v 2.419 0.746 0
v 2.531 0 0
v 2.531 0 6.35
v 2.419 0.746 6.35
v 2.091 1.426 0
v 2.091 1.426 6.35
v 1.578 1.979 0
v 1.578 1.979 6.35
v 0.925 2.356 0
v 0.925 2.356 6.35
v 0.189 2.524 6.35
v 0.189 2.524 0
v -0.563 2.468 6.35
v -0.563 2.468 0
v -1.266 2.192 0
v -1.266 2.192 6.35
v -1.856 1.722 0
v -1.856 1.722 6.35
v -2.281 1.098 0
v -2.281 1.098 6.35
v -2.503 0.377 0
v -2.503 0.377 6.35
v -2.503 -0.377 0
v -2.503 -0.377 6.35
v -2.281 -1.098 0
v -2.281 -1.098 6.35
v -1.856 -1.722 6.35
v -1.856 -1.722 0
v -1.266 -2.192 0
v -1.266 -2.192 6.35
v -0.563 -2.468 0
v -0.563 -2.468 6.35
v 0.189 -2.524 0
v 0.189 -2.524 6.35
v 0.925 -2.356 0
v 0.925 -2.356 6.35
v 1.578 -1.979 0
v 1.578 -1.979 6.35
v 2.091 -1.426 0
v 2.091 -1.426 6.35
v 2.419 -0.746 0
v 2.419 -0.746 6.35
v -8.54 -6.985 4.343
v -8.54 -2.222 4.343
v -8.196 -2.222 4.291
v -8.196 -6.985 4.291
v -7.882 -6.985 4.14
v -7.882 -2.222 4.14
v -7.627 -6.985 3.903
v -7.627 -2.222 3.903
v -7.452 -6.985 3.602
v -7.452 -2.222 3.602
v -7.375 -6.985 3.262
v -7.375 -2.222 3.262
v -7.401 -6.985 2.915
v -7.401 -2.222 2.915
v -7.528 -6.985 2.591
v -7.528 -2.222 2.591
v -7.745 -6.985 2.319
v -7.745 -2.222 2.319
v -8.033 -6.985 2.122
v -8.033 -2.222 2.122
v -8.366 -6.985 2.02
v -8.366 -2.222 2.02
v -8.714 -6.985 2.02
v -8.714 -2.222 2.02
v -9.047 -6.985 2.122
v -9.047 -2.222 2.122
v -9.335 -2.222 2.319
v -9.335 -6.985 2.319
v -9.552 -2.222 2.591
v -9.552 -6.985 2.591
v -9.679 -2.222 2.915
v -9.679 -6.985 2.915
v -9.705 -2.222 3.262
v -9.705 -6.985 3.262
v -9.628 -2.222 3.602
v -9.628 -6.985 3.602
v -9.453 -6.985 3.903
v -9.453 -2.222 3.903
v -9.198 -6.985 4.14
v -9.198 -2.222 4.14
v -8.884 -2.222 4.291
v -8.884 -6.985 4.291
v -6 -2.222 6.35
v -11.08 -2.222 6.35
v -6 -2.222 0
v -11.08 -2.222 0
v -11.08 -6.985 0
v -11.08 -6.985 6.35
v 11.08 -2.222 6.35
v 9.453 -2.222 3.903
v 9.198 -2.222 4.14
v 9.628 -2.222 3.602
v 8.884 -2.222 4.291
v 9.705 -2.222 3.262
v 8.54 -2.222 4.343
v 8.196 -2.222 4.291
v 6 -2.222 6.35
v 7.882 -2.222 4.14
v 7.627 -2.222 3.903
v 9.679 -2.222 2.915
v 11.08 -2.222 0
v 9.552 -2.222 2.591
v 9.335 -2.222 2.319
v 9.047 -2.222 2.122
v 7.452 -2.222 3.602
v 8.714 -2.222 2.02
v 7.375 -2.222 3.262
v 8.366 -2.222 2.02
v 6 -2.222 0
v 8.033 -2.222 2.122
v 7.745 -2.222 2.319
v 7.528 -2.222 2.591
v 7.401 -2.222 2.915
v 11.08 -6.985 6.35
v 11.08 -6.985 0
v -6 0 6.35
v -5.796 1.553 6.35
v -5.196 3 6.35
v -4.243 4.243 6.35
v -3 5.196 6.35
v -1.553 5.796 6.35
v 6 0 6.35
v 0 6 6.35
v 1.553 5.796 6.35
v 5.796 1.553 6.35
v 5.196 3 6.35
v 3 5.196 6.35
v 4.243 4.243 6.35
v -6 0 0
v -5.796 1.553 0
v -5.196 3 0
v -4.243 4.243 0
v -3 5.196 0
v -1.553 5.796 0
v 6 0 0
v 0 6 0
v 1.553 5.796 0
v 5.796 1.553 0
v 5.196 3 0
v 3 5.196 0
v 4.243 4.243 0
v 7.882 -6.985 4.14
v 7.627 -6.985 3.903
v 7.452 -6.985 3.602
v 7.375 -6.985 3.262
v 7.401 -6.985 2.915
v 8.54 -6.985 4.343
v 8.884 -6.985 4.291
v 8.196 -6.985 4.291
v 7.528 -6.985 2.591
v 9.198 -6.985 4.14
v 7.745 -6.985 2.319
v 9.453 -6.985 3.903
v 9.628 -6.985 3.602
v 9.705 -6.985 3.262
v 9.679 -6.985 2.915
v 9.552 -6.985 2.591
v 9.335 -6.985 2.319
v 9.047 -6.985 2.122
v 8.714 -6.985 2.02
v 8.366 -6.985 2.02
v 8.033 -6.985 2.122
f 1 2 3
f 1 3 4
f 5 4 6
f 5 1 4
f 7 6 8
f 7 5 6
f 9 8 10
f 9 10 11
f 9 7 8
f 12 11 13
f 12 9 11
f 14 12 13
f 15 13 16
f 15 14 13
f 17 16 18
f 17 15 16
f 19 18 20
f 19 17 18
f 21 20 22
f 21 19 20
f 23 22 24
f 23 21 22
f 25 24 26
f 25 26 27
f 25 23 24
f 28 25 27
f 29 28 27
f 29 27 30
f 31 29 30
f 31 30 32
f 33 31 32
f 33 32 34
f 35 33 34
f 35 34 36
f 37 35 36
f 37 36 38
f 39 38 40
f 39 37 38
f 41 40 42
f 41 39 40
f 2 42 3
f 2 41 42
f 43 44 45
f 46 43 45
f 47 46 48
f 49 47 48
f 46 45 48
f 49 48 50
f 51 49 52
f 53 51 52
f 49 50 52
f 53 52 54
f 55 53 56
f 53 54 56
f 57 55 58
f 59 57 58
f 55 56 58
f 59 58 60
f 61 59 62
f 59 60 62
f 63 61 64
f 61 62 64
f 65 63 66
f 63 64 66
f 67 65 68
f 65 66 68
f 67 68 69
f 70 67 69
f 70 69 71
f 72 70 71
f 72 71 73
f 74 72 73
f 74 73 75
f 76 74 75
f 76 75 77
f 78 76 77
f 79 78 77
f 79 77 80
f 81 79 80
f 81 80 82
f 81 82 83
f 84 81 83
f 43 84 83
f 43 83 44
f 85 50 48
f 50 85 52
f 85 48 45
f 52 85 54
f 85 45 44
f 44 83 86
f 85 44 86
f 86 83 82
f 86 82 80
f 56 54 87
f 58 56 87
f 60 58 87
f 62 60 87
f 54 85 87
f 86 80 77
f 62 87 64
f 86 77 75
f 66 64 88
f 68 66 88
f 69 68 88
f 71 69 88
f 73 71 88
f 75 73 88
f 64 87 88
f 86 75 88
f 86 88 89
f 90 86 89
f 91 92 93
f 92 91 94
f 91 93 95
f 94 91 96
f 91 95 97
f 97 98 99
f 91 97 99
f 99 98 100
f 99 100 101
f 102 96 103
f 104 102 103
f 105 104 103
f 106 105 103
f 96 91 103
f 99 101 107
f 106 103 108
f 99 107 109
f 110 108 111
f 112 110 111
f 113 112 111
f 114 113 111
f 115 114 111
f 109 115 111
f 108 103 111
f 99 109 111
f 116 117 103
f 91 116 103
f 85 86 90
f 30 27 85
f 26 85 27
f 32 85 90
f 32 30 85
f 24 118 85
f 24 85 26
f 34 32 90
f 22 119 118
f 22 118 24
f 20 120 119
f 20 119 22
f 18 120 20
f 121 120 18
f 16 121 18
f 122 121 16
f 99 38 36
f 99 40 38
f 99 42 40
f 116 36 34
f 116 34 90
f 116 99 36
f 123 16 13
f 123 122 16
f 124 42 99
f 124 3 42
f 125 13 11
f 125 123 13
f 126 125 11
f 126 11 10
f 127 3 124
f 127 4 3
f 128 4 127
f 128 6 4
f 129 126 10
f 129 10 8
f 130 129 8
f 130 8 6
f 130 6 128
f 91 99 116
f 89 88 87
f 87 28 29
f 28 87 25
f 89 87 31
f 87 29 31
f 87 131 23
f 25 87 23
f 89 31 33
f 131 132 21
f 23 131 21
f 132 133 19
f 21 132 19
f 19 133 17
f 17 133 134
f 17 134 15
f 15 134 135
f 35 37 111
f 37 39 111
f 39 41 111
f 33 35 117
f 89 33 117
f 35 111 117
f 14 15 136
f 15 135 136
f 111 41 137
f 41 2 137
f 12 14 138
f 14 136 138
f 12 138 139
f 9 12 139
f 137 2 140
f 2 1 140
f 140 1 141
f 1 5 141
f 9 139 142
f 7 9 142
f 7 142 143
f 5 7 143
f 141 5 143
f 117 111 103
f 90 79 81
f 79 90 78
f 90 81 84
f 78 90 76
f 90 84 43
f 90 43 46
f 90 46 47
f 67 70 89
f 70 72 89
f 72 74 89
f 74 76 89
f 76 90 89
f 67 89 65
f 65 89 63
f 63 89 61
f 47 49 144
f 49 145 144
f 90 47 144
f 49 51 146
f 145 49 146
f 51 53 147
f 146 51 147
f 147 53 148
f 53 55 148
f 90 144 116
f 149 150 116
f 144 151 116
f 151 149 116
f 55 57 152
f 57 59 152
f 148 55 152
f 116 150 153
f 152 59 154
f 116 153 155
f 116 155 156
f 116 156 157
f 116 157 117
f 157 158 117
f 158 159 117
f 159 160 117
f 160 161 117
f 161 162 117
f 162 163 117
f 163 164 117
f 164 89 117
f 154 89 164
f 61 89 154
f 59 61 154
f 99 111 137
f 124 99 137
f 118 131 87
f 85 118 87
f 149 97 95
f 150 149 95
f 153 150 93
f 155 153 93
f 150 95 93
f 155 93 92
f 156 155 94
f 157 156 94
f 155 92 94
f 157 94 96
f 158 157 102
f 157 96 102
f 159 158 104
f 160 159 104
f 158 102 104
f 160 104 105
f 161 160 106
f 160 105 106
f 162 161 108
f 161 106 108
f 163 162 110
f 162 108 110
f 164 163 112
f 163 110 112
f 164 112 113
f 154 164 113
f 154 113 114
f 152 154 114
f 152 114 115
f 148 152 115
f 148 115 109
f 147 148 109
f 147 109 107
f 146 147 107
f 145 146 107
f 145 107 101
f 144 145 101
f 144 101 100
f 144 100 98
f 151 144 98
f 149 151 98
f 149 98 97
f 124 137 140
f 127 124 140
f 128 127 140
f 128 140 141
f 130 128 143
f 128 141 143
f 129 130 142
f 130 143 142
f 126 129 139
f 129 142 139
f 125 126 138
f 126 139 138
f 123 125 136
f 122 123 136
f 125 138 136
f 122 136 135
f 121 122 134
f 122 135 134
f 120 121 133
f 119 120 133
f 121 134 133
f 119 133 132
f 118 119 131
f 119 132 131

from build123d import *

# Parameters (mm, degrees)
SKETCH1_R           = 2.53125
BOSS_EXTRUDE1_DEPTH = 6.35
SKETCH2_R           = 1.1684
CUT_EXTRUDE1_DEPTH  = 6.35


with BuildPart() as part:
    # Sketch1 → Boss-Extrude1 (new body)
    with BuildSketch(Plane.XY):
        with BuildLine():
            Line((-6, 0), (-6, -2.2225))
            Line((-6, -2.2225), (-11.08, -2.2225))
            Line((-11.08, -2.2225), (-11.08, -6.985))
            Line((-11.08, -6.985), (11.08, -6.985))
            Line((11.08, -6.985), (11.08, -2.2225))
            Line((11.08, -2.2225), (6, -2.2225))
            Line((6, -2.2225), (6, 0))
            ThreePointArc((6, 0), (0, 6), (-6, 0))
        make_face()
        Circle(SKETCH1_R, mode=Mode.SUBTRACT)
    extrude(amount=BOSS_EXTRUDE1_DEPTH)

    # Sketch2 → Cut-Extrude1 (cut)
    with BuildSketch(Plane(origin=(0, -2.2225, 0), x_dir=(1, 0, 0), z_dir=(0, 1, 0))):
        with Locations(Location((-8.54, -3.175, 0), (0, 0, 270))):
            Circle(SKETCH2_R)
        with Locations(Location((8.54, -3.175, 0), (0, 0, 270))):
            Circle(SKETCH2_R)
    extrude(amount=-CUT_EXTRUDE1_DEPTH, mode=Mode.SUBTRACT)


solid = part.part
